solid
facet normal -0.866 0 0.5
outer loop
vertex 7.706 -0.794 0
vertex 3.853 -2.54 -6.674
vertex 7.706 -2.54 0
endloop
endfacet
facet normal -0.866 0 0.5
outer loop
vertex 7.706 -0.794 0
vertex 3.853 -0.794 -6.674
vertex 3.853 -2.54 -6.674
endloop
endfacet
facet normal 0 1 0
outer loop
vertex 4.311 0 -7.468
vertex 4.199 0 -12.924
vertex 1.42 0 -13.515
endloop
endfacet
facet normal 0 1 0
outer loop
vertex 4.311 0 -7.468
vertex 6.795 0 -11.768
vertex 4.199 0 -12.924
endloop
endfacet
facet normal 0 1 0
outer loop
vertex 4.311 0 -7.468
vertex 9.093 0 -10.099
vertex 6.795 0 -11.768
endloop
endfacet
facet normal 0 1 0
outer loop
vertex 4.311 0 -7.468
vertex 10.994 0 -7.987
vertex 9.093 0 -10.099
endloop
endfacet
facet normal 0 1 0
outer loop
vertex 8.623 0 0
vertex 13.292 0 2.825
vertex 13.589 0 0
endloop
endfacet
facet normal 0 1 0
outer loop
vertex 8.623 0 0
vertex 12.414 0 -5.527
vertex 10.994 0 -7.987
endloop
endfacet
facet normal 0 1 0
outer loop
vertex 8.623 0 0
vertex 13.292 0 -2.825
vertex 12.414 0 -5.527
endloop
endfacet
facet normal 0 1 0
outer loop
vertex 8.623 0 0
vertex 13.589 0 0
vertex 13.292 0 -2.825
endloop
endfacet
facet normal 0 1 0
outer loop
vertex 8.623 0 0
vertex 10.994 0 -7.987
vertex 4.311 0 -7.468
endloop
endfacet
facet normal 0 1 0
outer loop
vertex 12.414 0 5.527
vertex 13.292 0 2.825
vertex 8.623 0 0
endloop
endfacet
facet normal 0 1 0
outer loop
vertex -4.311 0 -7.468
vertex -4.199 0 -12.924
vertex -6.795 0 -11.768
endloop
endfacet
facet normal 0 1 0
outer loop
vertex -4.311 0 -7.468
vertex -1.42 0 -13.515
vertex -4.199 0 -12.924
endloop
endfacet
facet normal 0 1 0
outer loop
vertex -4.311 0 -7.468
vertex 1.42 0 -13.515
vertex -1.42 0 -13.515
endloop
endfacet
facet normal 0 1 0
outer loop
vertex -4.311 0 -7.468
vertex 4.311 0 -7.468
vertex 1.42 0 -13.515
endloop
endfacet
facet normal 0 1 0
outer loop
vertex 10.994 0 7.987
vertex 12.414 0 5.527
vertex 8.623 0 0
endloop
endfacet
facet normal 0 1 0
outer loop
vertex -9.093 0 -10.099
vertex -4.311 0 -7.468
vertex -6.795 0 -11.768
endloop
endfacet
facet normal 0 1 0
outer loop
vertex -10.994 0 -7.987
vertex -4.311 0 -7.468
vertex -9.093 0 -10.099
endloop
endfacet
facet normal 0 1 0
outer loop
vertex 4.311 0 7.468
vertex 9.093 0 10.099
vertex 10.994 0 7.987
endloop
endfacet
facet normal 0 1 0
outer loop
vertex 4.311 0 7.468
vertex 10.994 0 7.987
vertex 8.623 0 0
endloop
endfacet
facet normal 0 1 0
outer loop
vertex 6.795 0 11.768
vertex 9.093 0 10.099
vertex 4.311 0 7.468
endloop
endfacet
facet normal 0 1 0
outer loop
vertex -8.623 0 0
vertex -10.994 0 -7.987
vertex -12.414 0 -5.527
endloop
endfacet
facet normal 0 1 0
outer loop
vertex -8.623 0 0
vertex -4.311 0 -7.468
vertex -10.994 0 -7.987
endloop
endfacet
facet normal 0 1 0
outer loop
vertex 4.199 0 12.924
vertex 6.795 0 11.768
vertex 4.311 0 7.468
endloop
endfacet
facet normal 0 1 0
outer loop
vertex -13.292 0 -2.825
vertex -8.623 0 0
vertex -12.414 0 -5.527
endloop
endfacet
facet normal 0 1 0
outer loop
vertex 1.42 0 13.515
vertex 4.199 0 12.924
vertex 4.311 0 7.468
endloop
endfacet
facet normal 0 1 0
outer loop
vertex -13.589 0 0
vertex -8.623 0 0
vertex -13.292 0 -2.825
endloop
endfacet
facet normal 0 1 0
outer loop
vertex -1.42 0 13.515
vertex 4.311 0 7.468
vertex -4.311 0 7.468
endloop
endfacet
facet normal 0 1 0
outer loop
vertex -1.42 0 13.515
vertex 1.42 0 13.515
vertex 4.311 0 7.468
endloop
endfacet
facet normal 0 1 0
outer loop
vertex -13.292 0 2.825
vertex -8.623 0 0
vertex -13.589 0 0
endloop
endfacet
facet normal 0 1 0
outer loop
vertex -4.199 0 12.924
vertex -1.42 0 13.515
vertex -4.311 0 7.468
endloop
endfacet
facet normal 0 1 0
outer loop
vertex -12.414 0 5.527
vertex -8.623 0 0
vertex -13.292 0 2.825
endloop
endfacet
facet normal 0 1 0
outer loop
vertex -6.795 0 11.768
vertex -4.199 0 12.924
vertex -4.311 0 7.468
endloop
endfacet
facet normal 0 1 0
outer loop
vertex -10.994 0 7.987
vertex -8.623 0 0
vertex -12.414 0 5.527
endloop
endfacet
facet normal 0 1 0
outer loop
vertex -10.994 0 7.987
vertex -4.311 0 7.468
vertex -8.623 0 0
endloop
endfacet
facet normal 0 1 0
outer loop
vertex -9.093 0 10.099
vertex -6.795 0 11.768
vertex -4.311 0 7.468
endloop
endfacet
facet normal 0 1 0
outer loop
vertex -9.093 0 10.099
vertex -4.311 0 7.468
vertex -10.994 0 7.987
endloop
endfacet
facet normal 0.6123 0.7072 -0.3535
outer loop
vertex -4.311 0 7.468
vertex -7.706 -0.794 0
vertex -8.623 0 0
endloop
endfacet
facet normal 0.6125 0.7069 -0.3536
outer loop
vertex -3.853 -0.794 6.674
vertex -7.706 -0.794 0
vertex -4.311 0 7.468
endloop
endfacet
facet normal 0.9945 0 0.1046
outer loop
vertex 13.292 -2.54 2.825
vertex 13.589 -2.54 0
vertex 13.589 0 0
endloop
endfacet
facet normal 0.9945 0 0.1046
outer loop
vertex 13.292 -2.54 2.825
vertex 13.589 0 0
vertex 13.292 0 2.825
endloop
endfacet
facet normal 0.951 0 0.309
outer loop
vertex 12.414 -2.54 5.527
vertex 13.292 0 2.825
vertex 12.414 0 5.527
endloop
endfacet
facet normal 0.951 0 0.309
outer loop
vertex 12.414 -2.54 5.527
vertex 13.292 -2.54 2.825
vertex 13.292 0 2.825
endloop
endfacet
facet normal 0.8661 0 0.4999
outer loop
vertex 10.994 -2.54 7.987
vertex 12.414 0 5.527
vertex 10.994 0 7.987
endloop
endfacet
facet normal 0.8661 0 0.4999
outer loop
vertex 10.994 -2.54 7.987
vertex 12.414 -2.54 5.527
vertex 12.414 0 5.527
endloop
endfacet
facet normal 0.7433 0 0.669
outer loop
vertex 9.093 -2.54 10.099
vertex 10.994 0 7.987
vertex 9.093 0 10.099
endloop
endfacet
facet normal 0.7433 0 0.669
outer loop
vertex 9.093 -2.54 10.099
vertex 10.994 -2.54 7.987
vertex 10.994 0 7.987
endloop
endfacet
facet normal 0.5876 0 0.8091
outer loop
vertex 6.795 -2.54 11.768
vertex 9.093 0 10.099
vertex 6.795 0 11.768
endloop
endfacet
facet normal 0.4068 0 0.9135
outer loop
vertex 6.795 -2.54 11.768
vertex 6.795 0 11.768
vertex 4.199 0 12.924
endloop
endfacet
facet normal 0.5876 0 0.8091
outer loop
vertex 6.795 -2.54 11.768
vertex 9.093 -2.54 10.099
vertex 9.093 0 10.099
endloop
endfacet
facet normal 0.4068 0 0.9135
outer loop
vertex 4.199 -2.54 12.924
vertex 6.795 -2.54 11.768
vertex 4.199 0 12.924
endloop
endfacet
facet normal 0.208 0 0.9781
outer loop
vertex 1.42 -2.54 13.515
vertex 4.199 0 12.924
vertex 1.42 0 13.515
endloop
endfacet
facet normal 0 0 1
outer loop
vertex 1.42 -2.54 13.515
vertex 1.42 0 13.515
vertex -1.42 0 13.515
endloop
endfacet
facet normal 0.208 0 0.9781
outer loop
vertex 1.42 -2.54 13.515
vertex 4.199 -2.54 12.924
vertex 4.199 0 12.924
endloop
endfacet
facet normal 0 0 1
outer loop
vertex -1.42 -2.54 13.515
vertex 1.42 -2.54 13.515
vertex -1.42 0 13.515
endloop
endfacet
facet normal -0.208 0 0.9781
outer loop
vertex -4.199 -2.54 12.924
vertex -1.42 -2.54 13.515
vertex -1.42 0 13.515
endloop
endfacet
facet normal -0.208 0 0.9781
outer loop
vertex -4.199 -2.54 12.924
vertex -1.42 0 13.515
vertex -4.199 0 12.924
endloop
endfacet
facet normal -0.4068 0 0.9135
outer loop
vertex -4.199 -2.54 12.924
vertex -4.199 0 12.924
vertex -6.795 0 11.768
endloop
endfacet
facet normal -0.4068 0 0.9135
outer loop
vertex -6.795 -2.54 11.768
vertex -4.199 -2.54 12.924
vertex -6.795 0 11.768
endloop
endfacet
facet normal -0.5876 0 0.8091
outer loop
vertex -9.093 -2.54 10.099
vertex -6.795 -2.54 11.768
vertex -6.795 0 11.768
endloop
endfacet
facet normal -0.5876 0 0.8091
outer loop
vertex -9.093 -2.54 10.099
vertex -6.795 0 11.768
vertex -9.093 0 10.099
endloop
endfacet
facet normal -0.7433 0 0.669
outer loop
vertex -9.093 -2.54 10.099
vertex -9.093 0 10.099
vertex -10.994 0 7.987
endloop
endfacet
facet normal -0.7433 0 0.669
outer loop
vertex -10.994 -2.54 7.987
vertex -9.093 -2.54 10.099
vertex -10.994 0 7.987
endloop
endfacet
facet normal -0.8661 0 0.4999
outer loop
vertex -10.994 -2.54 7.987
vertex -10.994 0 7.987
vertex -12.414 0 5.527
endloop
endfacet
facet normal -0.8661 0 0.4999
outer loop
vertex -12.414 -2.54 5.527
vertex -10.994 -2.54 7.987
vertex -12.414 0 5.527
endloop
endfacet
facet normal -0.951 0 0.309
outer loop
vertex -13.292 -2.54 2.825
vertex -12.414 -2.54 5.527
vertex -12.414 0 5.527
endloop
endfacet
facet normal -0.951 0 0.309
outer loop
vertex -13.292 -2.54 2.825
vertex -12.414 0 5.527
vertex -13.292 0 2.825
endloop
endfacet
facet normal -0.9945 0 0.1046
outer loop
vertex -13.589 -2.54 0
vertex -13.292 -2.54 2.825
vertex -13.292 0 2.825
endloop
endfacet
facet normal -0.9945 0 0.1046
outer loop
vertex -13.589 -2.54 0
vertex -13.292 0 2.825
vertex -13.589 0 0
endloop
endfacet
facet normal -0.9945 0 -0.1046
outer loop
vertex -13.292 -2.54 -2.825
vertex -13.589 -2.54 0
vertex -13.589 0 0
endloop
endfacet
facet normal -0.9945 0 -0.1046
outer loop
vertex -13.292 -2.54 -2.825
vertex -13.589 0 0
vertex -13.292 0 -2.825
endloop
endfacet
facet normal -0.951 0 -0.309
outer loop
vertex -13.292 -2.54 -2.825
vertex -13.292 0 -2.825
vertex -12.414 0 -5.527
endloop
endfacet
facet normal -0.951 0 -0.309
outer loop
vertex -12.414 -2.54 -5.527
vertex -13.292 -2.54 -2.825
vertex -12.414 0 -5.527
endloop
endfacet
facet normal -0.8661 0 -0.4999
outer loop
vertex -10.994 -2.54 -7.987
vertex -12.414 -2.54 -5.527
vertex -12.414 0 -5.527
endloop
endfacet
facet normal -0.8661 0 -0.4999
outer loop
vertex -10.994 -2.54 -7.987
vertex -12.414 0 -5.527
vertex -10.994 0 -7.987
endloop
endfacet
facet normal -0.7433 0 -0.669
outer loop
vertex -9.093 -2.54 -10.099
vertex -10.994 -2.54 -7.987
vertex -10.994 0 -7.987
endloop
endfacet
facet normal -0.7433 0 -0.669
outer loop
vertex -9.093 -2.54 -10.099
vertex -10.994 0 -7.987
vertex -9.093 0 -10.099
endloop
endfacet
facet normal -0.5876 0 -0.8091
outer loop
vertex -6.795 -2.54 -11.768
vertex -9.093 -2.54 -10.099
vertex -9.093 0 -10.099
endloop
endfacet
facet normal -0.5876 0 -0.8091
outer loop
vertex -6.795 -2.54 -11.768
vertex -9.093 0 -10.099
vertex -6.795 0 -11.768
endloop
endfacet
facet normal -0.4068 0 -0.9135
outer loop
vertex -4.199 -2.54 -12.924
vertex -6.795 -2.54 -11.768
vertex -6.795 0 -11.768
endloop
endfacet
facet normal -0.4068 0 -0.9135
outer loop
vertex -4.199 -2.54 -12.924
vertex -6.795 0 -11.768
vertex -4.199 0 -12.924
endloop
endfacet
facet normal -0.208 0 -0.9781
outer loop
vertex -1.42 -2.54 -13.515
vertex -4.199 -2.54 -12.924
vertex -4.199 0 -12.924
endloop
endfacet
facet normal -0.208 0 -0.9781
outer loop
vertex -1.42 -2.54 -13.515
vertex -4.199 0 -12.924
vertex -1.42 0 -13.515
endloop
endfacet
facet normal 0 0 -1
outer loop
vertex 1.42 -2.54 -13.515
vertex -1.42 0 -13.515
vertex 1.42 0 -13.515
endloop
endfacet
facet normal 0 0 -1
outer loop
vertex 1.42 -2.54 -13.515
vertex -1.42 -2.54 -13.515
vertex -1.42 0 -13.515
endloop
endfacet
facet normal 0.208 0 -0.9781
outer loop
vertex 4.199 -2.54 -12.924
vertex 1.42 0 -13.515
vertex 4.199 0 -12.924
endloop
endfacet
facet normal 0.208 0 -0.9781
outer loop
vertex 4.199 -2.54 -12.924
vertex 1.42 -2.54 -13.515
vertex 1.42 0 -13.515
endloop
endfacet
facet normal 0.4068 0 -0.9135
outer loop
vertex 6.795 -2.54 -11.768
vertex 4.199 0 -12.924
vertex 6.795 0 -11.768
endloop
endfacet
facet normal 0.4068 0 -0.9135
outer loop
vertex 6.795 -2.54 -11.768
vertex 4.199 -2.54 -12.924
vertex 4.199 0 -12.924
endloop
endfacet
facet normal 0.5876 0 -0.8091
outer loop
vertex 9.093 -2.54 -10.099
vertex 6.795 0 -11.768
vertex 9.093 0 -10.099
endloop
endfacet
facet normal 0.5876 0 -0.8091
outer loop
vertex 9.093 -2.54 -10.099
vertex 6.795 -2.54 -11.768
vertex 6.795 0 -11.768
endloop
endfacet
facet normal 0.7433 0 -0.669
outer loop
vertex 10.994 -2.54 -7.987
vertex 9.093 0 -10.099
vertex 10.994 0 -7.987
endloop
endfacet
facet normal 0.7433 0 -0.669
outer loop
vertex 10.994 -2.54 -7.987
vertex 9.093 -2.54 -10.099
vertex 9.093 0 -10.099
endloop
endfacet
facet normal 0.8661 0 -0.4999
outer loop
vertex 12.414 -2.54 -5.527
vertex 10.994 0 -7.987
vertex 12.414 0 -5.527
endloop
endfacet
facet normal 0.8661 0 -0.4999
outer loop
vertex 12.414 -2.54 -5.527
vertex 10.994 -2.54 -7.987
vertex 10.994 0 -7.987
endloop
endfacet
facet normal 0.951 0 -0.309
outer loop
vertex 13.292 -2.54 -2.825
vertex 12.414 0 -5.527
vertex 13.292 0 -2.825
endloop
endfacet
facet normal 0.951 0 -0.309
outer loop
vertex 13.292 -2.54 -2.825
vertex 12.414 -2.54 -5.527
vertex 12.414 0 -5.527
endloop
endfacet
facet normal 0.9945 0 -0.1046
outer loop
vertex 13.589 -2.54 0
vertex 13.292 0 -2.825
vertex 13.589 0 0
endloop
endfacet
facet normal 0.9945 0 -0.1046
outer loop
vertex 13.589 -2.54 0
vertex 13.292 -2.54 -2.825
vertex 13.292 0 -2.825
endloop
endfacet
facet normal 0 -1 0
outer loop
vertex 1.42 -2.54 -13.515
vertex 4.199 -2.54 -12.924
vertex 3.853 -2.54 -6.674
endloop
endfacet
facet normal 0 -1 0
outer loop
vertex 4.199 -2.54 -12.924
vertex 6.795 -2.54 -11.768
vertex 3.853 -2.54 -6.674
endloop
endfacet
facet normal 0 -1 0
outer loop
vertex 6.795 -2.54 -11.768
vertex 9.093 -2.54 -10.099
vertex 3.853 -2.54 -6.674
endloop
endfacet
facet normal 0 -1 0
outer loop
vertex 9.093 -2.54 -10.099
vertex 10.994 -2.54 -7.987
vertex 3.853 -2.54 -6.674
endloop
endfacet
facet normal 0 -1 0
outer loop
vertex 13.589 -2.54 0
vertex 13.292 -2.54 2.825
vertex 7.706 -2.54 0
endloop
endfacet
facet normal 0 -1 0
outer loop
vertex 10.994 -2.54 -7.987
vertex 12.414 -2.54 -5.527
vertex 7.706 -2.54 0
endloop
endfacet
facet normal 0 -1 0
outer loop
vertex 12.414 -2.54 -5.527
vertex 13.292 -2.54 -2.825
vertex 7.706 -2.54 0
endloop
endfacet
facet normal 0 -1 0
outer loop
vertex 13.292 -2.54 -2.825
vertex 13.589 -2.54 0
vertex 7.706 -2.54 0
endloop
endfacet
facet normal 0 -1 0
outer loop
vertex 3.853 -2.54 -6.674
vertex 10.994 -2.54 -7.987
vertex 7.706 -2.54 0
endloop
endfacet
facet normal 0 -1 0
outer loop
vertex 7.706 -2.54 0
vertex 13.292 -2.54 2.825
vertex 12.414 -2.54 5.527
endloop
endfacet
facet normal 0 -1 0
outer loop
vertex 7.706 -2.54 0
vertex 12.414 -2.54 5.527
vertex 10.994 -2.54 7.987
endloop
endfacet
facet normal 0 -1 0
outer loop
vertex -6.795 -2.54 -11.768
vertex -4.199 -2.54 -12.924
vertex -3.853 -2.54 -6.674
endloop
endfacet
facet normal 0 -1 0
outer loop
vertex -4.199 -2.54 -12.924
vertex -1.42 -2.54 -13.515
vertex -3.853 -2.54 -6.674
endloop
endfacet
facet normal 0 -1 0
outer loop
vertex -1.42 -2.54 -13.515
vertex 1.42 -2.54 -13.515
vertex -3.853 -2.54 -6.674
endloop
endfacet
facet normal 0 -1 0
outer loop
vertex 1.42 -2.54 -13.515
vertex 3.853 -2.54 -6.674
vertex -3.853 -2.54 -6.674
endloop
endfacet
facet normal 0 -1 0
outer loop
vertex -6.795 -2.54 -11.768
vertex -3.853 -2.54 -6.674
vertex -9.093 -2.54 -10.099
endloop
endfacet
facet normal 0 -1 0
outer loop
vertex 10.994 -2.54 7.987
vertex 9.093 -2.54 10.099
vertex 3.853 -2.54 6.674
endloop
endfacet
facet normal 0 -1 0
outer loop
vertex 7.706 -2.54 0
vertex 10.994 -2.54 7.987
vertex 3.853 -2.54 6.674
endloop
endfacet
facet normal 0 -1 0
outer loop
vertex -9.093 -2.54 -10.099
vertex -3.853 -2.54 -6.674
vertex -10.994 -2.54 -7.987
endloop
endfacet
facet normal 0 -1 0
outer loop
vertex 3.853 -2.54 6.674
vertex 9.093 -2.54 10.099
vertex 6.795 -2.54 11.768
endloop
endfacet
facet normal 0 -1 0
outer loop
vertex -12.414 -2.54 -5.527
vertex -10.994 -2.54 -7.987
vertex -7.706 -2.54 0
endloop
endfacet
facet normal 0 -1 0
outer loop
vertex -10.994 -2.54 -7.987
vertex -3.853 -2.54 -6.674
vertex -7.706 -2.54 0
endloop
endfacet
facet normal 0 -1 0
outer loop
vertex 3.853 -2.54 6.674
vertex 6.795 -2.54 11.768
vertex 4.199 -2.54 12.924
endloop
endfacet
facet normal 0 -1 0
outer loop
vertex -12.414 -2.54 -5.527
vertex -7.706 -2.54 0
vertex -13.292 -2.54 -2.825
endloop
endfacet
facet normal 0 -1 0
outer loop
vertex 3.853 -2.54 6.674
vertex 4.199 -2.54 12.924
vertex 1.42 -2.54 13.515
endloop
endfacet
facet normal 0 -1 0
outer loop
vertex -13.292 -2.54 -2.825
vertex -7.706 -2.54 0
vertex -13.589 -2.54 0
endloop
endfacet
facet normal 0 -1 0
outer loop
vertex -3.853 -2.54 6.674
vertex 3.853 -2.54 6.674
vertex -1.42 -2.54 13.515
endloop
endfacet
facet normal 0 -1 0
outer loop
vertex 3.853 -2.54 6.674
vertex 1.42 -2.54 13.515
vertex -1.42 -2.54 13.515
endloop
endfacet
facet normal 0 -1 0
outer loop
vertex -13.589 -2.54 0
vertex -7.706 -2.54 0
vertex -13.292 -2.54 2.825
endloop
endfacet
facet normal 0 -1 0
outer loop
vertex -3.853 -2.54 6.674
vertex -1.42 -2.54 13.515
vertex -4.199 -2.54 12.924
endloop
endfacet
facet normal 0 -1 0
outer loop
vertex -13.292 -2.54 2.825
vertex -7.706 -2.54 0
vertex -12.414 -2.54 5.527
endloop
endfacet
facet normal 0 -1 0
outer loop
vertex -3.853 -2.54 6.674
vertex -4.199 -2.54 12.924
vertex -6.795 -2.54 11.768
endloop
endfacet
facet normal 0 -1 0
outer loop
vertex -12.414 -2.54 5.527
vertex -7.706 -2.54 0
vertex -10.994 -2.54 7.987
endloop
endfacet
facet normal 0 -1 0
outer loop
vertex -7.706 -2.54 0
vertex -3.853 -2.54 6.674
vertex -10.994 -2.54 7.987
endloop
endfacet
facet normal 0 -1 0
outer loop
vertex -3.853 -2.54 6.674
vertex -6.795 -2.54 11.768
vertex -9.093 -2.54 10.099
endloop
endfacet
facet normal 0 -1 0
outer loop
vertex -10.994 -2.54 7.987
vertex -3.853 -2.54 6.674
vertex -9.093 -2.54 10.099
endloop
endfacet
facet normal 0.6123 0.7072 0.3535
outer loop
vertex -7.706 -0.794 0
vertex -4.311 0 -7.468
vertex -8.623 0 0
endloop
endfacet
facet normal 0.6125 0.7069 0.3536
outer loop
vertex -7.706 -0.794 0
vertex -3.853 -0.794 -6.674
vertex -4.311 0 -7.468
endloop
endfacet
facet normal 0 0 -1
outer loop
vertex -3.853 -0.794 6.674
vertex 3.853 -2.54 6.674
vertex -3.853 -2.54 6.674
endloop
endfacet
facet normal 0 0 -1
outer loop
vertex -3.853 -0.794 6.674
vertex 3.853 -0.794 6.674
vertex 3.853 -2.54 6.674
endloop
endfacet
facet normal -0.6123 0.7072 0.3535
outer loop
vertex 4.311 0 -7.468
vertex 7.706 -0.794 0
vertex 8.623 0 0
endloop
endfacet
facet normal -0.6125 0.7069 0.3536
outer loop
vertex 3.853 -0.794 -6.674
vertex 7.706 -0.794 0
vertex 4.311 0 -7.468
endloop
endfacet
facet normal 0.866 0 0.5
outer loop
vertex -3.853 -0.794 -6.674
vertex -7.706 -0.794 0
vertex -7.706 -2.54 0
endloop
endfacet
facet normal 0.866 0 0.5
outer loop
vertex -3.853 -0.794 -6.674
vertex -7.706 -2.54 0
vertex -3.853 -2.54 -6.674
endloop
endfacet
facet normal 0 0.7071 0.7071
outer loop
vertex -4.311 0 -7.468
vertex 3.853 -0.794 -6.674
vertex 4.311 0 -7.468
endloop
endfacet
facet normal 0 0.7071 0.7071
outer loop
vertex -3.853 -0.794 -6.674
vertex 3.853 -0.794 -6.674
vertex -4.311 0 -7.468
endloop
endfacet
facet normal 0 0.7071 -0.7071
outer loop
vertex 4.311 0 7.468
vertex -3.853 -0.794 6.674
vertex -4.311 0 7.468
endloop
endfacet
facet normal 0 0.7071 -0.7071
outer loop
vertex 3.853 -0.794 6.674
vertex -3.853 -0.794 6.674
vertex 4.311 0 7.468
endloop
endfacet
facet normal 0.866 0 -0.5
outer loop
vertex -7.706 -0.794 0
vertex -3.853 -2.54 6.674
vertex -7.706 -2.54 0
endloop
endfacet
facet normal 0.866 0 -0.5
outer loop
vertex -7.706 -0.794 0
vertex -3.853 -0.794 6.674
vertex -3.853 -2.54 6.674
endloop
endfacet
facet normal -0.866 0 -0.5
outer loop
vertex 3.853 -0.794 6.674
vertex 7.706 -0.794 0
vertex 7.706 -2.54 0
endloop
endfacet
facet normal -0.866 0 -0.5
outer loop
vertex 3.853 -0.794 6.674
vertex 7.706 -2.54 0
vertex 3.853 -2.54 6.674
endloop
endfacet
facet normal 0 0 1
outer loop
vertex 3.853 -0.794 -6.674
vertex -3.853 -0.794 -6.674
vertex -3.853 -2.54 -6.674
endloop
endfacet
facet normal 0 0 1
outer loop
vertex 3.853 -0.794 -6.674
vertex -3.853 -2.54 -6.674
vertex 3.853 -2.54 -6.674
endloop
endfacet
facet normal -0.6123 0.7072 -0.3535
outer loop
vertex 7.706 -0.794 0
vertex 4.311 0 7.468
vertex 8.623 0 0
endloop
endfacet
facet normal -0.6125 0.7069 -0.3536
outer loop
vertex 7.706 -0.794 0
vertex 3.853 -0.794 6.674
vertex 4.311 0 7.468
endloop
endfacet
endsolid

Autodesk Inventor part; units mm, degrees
ref_plane "YZ Plane" through (0, 0, 0) normal (1, 0, 0) x (0, 1, 0)
ref_plane "XZ Plane" through (0, 0, 0) normal (0, 1, 0) x (-1, 0, 0)
ref_plane "XY Plane" through (0, 0, 0) normal (0, 0, 1) x (1, 0, 0)
sketch "Sketch1" plane through (0, 0, 0) normal (0, 1, 0) x (-1, 0, 0)
  circle A0 centre (0, 0) radius 31.75
  dimension "od" = 63.5
extrude "Extrusion1" add sketch "Sketch1" against normal blind 2.54
sketch "Sketch2" plane through (0, 0, 0) normal (0, 1, 0) x (1, 0, 0)
  line L0 (-7.7063, 0) -> (-3.8531, 6.6738)
  line L1 (-3.8531, 6.6738) -> (3.8531, 6.6738)
  line L2 (3.8531, 6.6738) -> (7.7063, 0)
  line L3 (7.7063, 0) -> (3.8531, -6.6738)
  line L4 (3.8531, -6.6738) -> (-3.8531, -6.6738)
  line L5 (-3.8531, -6.6738) -> (-7.7063, 0)
  point P0 (0, 0)
  point P1 (0, 0)
  dimension "d3" = 13.3477
extrude "Extrusion2" cut sketch "Sketch2" against normal through all
chamfer "Chamfer1" distance 0.7937 angle 45 6 edges at (-5.7797, 0, -3.3369) (0, 0, -6.6738) (5.7797, 0, -3.3369) (5.7797, 0, 3.3369) (0, 0, 6.6738) (-5.7797, 0, 3.3369)
sketch "Sketch4" plane through (0, -2.54, 0) normal (0, -1, 0) x (1, 0, 0)
  circle A0 centre (0, 0) radius 13.589
  circle A1 centre (0, 0) radius 31.75
extrude "Extrusion4" cut sketch "Sketch4" against normal through all
properties part number "spacerForEndV03" material "PC/ABS Plastic"
